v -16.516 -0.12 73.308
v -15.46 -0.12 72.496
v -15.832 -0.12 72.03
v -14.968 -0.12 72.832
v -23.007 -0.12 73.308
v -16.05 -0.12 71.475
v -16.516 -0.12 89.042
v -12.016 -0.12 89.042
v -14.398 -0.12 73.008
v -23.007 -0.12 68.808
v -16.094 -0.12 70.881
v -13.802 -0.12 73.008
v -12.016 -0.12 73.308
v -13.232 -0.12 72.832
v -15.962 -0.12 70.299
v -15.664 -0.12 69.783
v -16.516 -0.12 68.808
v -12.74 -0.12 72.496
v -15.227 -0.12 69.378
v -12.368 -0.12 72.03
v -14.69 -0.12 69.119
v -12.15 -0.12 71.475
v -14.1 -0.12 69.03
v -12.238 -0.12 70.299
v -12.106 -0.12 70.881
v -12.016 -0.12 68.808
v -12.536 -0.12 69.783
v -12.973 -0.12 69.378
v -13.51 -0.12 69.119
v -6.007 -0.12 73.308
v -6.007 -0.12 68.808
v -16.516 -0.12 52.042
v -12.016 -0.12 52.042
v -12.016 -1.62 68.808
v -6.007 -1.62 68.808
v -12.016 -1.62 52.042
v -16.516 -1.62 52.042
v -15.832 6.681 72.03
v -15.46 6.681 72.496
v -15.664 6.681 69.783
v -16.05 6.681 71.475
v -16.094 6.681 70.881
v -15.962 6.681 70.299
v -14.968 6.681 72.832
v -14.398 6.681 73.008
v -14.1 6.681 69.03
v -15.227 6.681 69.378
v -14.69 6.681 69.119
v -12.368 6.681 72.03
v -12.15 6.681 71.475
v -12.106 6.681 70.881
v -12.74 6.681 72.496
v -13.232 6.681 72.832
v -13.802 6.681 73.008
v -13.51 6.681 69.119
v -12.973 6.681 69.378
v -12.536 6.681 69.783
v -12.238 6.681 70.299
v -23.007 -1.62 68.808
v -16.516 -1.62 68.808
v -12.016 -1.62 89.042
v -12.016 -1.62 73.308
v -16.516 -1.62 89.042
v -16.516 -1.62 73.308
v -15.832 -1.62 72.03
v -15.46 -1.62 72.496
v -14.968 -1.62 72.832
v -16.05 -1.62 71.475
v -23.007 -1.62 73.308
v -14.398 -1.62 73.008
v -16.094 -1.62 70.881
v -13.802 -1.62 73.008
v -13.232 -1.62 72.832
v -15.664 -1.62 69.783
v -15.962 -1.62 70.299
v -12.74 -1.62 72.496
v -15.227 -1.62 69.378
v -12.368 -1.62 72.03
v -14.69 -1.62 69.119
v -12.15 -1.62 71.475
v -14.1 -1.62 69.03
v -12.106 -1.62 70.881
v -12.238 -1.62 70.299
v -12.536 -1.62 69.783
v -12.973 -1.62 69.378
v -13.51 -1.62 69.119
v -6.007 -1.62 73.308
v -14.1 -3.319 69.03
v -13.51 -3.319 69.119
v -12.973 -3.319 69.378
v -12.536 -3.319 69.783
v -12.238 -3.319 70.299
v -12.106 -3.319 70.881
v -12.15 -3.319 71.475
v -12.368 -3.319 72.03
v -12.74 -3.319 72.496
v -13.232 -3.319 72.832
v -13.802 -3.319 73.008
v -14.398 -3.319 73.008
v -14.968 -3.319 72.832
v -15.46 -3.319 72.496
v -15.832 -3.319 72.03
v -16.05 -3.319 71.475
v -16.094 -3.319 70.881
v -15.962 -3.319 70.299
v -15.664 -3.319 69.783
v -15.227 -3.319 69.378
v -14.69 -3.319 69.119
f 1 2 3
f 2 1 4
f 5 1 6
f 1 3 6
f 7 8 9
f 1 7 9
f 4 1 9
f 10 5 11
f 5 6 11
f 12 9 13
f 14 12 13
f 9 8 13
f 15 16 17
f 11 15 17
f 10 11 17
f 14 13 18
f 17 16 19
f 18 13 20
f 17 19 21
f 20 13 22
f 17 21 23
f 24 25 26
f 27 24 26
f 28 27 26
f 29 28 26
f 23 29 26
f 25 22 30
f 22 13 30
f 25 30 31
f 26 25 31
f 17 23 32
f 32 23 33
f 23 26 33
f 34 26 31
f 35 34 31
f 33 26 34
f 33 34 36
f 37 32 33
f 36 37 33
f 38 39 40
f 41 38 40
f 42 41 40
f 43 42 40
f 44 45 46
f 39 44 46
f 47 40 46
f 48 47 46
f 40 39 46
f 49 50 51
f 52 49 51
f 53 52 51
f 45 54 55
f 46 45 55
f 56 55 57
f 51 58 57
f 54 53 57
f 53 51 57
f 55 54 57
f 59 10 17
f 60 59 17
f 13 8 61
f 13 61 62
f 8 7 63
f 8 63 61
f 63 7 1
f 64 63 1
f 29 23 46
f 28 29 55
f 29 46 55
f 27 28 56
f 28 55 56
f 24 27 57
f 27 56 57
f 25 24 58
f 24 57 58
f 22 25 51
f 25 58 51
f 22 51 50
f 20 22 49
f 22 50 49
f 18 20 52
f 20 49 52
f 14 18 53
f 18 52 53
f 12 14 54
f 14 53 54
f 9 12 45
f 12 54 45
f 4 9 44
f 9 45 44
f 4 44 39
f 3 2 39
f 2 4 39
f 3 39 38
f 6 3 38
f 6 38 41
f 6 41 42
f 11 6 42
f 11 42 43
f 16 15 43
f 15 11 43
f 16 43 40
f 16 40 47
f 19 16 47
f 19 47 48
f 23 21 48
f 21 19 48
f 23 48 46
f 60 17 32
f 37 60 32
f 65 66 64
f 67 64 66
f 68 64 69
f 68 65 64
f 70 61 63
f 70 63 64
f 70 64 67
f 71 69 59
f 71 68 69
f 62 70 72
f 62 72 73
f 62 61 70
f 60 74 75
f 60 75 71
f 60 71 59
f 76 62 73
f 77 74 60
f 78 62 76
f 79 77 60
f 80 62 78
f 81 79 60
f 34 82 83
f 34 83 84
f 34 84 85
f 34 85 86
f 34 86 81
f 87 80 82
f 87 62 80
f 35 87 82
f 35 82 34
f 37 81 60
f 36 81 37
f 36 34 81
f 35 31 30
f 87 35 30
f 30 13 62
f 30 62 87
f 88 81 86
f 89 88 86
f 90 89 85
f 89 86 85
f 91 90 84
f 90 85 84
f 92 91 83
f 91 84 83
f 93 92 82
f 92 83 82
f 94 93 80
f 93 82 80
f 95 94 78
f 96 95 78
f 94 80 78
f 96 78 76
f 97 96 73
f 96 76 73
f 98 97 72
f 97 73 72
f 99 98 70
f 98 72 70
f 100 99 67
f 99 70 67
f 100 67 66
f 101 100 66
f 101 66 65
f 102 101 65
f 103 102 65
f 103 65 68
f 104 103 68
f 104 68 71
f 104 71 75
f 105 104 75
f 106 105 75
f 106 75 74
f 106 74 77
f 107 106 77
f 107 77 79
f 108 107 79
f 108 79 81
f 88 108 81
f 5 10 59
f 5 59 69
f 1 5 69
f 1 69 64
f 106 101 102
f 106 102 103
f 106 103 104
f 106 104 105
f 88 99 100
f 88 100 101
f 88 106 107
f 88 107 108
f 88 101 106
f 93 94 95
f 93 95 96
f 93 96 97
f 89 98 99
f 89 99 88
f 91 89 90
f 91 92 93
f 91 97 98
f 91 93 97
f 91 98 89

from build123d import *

# Parameters (mm, degrees)
CYLINDER037_R             = 2
CYLINDER037_DEPTH         = 10
BOX005_W                  = 37
BOX005_H                  = 4.5
BOX005_DEPTH              = 1.5
BOX006_W                  = 17
BOX006_H                  = 4.5
BOX006_DEPTH              = 1.5
BOX006_PLACEMENT_ANGLE    = 90
FUSION006_PITCH_ANGLE     = 90
FUSION006_PLACEMENT_ANGLE = -90


with BuildPart() as cylinder037:
    # Cylinder037 → Cylinder037 (new body)
    with BuildSketch(Plane(origin=(34.5, 34.5, 10.7594), x_dir=(1, 0, 0), z_dir=(0, 0, 1))):
        Circle(CYLINDER037_R)
    extrude(amount=CYLINDER037_DEPTH)


with BuildPart() as box005:
    # Box005 → Box005 (new body)
    with BuildSketch(Plane.XY):
        with Locations((18.5, 2.25)):
            Rectangle(BOX005_W, BOX005_H)
    extrude(amount=BOX005_DEPTH)


with BuildPart() as fusion006:
    # Box006 → Box006 (new body)
    with BuildSketch(Plane.XY):
        with Locations((8.5, 2.25)):
            Rectangle(BOX006_W, BOX006_H)
    extrude(amount=BOX006_DEPTH)


with BuildPart() as fusion006_1:
    # Box006 placement: moved
    add(fusion006.part.moved(Location((20.2342, -6.49055, 0))).rotate(Axis((20.2342, -6.49055, 0), (0, 0, 1)), BOX006_PLACEMENT_ANGLE))

    # Fusion004: union Box005
    add(box005.part)


with BuildPart() as fusion006_2:
    # Fusion004 placement: moved
    add(fusion006_1.part.moved(Location((16.4876, 32.0839, 17.56))))

    # Fusion006: union Cylinder037
    add(cylinder037.part)


with BuildPart() as fusion006_3:
    # Fusion006 pitch: moved
    add(fusion006_2.part.rotate(Axis((0, 0, 0), (0, 1, 0)), FUSION006_PITCH_ANGLE))


with BuildPart() as fusion006_4:
    # Fusion006 placement: moved
    add(fusion006_3.part.moved(Location((-48.6, 17.44, 105.53))).rotate(Axis((-48.6, 17.44, 105.53), (0, 0, 1)), FUSION006_PLACEMENT_ANGLE))


solid = fusion006_4.part
